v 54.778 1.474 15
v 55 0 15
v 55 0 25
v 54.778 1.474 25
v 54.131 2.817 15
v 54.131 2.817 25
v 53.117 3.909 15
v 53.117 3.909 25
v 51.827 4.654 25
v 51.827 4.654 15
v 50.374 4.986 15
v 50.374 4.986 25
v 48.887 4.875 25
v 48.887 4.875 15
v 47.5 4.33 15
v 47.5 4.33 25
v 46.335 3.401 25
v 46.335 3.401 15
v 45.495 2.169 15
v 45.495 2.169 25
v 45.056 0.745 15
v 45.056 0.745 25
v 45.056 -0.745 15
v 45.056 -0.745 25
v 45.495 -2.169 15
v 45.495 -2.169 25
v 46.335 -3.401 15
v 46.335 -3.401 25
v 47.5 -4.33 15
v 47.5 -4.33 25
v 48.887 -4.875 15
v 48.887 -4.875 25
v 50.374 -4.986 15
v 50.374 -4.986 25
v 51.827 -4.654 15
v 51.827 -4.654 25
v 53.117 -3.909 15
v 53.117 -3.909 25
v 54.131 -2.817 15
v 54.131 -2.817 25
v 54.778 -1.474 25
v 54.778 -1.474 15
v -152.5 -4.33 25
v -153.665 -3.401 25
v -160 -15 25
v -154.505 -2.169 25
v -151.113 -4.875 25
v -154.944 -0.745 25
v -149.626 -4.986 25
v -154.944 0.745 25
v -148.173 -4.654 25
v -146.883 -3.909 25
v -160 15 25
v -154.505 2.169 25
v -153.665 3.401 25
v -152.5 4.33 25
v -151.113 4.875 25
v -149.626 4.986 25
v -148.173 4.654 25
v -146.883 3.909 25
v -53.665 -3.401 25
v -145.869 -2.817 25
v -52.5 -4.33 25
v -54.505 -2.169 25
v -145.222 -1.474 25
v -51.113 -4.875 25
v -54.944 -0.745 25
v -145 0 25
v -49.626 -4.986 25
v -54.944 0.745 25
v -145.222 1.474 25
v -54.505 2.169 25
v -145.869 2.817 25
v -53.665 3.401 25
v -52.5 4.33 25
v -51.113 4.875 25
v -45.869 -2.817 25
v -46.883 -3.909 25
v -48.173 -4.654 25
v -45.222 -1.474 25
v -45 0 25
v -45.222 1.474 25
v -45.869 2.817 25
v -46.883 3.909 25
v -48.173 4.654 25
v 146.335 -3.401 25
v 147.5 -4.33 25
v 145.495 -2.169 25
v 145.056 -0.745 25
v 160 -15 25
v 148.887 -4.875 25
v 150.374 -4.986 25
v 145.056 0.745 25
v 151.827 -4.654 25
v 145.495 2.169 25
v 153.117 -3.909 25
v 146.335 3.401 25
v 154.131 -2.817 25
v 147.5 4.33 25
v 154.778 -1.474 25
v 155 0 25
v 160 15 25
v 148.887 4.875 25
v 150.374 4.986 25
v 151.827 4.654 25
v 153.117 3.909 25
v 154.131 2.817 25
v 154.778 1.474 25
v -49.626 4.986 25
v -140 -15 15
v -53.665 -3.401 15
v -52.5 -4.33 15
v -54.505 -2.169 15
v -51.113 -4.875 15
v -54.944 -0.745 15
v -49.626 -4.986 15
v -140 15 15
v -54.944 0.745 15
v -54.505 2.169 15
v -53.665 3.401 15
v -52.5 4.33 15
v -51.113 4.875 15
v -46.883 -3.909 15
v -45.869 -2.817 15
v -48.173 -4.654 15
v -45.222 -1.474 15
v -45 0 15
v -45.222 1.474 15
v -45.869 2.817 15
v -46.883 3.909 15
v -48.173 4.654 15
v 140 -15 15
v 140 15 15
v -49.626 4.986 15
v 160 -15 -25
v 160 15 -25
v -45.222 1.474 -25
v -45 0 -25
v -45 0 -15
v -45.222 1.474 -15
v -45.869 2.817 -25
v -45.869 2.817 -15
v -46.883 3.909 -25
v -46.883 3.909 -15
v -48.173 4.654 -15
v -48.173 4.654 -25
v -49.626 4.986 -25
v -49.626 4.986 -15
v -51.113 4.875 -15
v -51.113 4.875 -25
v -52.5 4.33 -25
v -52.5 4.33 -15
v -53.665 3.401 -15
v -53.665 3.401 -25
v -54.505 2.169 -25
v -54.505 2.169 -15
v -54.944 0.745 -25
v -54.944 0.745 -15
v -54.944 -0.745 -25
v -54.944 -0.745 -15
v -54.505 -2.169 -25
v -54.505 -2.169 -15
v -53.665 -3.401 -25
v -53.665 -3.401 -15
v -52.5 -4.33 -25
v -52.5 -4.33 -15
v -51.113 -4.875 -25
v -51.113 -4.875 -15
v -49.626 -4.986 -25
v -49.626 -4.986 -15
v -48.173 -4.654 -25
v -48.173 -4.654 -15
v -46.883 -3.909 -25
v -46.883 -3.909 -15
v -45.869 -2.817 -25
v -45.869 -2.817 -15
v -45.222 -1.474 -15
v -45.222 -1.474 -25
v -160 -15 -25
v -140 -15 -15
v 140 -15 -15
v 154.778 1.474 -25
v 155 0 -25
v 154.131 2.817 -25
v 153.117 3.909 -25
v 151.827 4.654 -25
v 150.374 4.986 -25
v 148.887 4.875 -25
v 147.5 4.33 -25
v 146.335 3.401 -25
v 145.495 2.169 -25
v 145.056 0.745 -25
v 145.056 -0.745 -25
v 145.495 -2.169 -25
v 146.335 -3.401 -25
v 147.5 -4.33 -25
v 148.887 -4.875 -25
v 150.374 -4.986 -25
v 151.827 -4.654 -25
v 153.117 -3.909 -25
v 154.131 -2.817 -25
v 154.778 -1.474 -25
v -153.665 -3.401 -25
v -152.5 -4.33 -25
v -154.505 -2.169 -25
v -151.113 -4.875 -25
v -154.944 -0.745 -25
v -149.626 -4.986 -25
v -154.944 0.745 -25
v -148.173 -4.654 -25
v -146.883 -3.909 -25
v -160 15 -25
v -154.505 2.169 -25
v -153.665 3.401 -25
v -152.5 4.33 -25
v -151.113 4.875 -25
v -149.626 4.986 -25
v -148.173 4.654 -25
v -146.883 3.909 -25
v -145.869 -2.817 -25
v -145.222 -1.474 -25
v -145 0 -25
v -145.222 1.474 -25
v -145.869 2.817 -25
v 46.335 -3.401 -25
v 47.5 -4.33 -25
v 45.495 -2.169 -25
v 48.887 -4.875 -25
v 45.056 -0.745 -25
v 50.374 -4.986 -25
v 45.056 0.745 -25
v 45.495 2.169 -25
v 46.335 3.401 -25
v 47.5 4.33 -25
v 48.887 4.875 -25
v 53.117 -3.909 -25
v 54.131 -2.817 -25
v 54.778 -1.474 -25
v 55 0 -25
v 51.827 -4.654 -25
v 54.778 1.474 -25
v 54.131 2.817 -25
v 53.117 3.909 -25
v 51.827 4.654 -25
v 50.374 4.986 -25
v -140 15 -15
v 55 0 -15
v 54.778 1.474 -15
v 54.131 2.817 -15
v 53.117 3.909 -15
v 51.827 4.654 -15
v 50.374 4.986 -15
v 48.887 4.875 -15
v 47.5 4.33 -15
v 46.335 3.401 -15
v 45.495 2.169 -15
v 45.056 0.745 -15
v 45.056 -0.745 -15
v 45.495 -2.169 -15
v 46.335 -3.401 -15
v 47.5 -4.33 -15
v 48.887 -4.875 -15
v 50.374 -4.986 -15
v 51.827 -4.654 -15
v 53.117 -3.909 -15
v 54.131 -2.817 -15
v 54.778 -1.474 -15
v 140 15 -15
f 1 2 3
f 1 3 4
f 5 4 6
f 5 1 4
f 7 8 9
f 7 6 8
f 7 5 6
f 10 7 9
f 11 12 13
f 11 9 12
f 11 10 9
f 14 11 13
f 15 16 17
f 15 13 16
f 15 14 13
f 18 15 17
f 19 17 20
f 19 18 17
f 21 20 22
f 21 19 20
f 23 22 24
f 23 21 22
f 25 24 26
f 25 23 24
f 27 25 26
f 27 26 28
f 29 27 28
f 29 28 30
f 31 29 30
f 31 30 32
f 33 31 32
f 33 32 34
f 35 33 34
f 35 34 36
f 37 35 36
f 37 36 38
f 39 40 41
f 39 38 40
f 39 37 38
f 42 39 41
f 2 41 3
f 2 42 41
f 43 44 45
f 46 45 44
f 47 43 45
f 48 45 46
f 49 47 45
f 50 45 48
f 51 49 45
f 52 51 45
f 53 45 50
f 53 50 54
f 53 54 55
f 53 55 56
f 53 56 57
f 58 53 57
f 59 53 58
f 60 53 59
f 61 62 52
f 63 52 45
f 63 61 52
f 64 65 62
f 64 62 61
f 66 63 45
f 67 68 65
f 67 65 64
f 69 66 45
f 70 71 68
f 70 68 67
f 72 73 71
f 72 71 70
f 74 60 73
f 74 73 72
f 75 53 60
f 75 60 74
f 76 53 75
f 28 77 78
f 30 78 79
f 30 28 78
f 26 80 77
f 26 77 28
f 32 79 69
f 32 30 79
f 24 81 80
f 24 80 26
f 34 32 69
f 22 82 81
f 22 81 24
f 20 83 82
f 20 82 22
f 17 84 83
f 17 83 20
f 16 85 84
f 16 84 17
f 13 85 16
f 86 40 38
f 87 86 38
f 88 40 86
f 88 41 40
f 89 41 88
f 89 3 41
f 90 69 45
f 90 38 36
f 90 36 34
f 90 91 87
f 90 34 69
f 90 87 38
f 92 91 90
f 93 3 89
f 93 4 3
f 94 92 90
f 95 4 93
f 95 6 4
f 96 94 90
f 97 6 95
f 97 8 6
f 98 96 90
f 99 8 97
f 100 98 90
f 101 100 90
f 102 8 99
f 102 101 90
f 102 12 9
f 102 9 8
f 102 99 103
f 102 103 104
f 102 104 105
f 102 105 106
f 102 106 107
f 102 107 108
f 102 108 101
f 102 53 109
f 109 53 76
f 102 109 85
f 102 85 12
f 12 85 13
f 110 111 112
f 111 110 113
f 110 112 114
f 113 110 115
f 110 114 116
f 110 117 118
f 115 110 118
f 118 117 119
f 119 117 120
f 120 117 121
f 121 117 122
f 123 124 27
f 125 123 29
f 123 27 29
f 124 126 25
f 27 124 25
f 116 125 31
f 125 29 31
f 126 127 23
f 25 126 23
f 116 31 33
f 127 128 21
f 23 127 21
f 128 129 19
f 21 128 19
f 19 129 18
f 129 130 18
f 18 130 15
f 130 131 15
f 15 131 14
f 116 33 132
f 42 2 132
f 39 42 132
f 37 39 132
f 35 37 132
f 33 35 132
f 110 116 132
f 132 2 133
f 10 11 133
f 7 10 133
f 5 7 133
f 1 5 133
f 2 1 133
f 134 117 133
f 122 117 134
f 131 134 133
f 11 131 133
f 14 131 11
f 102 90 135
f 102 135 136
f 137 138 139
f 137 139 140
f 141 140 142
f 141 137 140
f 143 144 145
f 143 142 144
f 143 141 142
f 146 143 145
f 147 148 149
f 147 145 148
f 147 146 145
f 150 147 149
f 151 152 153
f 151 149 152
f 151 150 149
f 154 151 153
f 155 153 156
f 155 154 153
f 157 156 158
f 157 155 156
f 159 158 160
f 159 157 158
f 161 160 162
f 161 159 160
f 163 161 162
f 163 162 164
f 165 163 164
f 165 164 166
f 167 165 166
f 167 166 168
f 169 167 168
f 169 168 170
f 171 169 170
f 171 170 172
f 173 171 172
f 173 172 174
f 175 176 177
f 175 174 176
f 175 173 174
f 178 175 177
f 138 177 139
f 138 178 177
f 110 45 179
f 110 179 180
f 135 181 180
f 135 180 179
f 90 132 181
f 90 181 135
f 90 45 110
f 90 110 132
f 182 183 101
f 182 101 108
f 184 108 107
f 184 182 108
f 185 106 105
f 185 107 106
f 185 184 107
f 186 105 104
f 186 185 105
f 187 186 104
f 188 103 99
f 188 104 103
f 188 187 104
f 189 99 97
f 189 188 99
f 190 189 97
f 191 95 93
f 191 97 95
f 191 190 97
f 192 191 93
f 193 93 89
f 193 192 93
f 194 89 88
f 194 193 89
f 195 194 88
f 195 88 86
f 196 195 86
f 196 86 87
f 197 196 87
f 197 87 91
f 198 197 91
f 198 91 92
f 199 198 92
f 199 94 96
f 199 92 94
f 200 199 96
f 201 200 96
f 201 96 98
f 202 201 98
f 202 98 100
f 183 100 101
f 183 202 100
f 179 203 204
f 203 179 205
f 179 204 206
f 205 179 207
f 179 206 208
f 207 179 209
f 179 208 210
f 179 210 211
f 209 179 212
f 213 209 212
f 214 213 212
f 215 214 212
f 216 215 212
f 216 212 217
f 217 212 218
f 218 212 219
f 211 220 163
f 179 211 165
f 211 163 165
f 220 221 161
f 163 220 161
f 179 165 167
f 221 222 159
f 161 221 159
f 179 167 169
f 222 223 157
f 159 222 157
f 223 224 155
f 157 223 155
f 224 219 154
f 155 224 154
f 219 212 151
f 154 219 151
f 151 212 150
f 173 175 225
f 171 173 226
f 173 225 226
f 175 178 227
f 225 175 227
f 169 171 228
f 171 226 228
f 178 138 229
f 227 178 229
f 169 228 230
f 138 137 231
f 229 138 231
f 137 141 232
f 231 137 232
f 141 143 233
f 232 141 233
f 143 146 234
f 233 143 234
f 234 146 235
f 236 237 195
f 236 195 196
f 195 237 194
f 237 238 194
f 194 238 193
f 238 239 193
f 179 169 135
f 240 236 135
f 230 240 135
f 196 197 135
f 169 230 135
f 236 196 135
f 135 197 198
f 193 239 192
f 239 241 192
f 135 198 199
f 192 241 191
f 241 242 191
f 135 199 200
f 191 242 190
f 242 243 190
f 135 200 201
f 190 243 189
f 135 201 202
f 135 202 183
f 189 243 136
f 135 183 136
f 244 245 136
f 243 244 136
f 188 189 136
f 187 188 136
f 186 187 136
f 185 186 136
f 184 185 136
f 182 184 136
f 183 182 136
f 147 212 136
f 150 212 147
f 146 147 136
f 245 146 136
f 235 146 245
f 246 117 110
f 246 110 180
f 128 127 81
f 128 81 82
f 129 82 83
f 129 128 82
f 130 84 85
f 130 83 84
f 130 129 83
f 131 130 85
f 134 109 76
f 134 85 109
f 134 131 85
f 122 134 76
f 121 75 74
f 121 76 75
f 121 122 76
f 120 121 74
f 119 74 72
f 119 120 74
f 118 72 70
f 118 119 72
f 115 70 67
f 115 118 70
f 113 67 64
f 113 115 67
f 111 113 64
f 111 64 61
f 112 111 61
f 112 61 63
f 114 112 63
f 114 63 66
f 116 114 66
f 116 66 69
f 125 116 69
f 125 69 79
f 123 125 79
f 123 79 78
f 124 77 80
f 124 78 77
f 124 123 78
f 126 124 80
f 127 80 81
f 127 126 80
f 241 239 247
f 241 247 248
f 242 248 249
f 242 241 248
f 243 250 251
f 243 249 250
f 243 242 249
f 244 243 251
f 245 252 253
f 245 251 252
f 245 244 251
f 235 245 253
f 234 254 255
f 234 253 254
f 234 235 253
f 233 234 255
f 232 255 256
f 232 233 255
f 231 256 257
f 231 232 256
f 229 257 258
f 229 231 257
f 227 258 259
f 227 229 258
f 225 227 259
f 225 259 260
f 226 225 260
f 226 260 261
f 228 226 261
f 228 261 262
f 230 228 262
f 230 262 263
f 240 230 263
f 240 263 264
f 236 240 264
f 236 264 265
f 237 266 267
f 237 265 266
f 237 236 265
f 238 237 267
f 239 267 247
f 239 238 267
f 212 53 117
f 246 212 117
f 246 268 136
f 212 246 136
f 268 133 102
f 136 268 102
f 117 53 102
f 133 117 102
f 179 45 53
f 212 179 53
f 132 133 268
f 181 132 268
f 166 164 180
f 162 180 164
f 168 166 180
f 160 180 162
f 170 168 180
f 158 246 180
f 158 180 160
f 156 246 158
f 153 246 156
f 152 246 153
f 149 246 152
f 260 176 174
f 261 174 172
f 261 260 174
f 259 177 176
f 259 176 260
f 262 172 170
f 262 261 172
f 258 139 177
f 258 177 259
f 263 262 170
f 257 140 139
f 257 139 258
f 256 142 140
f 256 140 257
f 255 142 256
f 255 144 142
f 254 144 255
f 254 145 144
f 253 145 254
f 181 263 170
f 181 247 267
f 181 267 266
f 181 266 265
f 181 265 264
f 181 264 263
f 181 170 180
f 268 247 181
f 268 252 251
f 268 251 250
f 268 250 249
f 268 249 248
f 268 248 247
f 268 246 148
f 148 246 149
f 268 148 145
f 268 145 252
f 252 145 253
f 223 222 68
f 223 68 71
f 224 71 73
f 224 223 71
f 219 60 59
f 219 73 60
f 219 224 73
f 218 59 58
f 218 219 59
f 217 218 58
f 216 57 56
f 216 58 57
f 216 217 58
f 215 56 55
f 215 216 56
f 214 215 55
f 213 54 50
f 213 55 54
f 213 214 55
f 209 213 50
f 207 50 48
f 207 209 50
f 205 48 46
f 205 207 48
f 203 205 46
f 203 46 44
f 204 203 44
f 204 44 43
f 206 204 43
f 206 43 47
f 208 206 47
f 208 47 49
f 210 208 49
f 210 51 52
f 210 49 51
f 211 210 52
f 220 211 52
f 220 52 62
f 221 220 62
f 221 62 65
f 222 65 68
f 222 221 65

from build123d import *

# Parameters (mm, degrees)
SKETCH1_W               = 320
SKETCH1_H               = 30
BOSS_EXTRUDE1_DEPTH     = 25
SKETCH2_W               = 280
SKETCH2_H               = 30
CUT_EXTRUDE1_DEPTH      = 25
CUT_EXTRUDE3_DEPTH      = 163.634559673
CUT_EXTRUDE3_DEPTH_BACK = 163.634559673
SKETCH3_R               = 5


with BuildPart() as part:
    # Sketch1 → Boss-Extrude1 (new, symmetric)
    with BuildSketch(Plane.XY):
        Rectangle(SKETCH1_W, SKETCH1_H)
    extrude(amount=BOSS_EXTRUDE1_DEPTH, both=True)

    # Sketch2 → Cut-Extrude1 (cut, symmetric)
    with BuildSketch(Plane(origin=(0, 0, 0), x_dir=(1, 0, 0), z_dir=(0, 1, 0))):
        Rectangle(SKETCH2_W, SKETCH2_H)
    extrude(amount=CUT_EXTRUDE1_DEPTH, both=True, mode=Mode.SUBTRACT)

    # Sketch3 → Cut-Extrude3 (cut, two sides: drawn at the far end of the back side and taken through both)
    with BuildSketch(Plane.XY.offset(-CUT_EXTRUDE3_DEPTH_BACK)):
        with Locations((-150, 0)):
            Circle(SKETCH3_R)
        with Locations((150, 0)):
            Circle(SKETCH3_R)
        with Locations((-50, 0)):
            Circle(SKETCH3_R)
        with Locations((50, 0)):
            Circle(SKETCH3_R)
    extrude(amount=CUT_EXTRUDE3_DEPTH + CUT_EXTRUDE3_DEPTH_BACK, mode=Mode.SUBTRACT)


solid = part.part
